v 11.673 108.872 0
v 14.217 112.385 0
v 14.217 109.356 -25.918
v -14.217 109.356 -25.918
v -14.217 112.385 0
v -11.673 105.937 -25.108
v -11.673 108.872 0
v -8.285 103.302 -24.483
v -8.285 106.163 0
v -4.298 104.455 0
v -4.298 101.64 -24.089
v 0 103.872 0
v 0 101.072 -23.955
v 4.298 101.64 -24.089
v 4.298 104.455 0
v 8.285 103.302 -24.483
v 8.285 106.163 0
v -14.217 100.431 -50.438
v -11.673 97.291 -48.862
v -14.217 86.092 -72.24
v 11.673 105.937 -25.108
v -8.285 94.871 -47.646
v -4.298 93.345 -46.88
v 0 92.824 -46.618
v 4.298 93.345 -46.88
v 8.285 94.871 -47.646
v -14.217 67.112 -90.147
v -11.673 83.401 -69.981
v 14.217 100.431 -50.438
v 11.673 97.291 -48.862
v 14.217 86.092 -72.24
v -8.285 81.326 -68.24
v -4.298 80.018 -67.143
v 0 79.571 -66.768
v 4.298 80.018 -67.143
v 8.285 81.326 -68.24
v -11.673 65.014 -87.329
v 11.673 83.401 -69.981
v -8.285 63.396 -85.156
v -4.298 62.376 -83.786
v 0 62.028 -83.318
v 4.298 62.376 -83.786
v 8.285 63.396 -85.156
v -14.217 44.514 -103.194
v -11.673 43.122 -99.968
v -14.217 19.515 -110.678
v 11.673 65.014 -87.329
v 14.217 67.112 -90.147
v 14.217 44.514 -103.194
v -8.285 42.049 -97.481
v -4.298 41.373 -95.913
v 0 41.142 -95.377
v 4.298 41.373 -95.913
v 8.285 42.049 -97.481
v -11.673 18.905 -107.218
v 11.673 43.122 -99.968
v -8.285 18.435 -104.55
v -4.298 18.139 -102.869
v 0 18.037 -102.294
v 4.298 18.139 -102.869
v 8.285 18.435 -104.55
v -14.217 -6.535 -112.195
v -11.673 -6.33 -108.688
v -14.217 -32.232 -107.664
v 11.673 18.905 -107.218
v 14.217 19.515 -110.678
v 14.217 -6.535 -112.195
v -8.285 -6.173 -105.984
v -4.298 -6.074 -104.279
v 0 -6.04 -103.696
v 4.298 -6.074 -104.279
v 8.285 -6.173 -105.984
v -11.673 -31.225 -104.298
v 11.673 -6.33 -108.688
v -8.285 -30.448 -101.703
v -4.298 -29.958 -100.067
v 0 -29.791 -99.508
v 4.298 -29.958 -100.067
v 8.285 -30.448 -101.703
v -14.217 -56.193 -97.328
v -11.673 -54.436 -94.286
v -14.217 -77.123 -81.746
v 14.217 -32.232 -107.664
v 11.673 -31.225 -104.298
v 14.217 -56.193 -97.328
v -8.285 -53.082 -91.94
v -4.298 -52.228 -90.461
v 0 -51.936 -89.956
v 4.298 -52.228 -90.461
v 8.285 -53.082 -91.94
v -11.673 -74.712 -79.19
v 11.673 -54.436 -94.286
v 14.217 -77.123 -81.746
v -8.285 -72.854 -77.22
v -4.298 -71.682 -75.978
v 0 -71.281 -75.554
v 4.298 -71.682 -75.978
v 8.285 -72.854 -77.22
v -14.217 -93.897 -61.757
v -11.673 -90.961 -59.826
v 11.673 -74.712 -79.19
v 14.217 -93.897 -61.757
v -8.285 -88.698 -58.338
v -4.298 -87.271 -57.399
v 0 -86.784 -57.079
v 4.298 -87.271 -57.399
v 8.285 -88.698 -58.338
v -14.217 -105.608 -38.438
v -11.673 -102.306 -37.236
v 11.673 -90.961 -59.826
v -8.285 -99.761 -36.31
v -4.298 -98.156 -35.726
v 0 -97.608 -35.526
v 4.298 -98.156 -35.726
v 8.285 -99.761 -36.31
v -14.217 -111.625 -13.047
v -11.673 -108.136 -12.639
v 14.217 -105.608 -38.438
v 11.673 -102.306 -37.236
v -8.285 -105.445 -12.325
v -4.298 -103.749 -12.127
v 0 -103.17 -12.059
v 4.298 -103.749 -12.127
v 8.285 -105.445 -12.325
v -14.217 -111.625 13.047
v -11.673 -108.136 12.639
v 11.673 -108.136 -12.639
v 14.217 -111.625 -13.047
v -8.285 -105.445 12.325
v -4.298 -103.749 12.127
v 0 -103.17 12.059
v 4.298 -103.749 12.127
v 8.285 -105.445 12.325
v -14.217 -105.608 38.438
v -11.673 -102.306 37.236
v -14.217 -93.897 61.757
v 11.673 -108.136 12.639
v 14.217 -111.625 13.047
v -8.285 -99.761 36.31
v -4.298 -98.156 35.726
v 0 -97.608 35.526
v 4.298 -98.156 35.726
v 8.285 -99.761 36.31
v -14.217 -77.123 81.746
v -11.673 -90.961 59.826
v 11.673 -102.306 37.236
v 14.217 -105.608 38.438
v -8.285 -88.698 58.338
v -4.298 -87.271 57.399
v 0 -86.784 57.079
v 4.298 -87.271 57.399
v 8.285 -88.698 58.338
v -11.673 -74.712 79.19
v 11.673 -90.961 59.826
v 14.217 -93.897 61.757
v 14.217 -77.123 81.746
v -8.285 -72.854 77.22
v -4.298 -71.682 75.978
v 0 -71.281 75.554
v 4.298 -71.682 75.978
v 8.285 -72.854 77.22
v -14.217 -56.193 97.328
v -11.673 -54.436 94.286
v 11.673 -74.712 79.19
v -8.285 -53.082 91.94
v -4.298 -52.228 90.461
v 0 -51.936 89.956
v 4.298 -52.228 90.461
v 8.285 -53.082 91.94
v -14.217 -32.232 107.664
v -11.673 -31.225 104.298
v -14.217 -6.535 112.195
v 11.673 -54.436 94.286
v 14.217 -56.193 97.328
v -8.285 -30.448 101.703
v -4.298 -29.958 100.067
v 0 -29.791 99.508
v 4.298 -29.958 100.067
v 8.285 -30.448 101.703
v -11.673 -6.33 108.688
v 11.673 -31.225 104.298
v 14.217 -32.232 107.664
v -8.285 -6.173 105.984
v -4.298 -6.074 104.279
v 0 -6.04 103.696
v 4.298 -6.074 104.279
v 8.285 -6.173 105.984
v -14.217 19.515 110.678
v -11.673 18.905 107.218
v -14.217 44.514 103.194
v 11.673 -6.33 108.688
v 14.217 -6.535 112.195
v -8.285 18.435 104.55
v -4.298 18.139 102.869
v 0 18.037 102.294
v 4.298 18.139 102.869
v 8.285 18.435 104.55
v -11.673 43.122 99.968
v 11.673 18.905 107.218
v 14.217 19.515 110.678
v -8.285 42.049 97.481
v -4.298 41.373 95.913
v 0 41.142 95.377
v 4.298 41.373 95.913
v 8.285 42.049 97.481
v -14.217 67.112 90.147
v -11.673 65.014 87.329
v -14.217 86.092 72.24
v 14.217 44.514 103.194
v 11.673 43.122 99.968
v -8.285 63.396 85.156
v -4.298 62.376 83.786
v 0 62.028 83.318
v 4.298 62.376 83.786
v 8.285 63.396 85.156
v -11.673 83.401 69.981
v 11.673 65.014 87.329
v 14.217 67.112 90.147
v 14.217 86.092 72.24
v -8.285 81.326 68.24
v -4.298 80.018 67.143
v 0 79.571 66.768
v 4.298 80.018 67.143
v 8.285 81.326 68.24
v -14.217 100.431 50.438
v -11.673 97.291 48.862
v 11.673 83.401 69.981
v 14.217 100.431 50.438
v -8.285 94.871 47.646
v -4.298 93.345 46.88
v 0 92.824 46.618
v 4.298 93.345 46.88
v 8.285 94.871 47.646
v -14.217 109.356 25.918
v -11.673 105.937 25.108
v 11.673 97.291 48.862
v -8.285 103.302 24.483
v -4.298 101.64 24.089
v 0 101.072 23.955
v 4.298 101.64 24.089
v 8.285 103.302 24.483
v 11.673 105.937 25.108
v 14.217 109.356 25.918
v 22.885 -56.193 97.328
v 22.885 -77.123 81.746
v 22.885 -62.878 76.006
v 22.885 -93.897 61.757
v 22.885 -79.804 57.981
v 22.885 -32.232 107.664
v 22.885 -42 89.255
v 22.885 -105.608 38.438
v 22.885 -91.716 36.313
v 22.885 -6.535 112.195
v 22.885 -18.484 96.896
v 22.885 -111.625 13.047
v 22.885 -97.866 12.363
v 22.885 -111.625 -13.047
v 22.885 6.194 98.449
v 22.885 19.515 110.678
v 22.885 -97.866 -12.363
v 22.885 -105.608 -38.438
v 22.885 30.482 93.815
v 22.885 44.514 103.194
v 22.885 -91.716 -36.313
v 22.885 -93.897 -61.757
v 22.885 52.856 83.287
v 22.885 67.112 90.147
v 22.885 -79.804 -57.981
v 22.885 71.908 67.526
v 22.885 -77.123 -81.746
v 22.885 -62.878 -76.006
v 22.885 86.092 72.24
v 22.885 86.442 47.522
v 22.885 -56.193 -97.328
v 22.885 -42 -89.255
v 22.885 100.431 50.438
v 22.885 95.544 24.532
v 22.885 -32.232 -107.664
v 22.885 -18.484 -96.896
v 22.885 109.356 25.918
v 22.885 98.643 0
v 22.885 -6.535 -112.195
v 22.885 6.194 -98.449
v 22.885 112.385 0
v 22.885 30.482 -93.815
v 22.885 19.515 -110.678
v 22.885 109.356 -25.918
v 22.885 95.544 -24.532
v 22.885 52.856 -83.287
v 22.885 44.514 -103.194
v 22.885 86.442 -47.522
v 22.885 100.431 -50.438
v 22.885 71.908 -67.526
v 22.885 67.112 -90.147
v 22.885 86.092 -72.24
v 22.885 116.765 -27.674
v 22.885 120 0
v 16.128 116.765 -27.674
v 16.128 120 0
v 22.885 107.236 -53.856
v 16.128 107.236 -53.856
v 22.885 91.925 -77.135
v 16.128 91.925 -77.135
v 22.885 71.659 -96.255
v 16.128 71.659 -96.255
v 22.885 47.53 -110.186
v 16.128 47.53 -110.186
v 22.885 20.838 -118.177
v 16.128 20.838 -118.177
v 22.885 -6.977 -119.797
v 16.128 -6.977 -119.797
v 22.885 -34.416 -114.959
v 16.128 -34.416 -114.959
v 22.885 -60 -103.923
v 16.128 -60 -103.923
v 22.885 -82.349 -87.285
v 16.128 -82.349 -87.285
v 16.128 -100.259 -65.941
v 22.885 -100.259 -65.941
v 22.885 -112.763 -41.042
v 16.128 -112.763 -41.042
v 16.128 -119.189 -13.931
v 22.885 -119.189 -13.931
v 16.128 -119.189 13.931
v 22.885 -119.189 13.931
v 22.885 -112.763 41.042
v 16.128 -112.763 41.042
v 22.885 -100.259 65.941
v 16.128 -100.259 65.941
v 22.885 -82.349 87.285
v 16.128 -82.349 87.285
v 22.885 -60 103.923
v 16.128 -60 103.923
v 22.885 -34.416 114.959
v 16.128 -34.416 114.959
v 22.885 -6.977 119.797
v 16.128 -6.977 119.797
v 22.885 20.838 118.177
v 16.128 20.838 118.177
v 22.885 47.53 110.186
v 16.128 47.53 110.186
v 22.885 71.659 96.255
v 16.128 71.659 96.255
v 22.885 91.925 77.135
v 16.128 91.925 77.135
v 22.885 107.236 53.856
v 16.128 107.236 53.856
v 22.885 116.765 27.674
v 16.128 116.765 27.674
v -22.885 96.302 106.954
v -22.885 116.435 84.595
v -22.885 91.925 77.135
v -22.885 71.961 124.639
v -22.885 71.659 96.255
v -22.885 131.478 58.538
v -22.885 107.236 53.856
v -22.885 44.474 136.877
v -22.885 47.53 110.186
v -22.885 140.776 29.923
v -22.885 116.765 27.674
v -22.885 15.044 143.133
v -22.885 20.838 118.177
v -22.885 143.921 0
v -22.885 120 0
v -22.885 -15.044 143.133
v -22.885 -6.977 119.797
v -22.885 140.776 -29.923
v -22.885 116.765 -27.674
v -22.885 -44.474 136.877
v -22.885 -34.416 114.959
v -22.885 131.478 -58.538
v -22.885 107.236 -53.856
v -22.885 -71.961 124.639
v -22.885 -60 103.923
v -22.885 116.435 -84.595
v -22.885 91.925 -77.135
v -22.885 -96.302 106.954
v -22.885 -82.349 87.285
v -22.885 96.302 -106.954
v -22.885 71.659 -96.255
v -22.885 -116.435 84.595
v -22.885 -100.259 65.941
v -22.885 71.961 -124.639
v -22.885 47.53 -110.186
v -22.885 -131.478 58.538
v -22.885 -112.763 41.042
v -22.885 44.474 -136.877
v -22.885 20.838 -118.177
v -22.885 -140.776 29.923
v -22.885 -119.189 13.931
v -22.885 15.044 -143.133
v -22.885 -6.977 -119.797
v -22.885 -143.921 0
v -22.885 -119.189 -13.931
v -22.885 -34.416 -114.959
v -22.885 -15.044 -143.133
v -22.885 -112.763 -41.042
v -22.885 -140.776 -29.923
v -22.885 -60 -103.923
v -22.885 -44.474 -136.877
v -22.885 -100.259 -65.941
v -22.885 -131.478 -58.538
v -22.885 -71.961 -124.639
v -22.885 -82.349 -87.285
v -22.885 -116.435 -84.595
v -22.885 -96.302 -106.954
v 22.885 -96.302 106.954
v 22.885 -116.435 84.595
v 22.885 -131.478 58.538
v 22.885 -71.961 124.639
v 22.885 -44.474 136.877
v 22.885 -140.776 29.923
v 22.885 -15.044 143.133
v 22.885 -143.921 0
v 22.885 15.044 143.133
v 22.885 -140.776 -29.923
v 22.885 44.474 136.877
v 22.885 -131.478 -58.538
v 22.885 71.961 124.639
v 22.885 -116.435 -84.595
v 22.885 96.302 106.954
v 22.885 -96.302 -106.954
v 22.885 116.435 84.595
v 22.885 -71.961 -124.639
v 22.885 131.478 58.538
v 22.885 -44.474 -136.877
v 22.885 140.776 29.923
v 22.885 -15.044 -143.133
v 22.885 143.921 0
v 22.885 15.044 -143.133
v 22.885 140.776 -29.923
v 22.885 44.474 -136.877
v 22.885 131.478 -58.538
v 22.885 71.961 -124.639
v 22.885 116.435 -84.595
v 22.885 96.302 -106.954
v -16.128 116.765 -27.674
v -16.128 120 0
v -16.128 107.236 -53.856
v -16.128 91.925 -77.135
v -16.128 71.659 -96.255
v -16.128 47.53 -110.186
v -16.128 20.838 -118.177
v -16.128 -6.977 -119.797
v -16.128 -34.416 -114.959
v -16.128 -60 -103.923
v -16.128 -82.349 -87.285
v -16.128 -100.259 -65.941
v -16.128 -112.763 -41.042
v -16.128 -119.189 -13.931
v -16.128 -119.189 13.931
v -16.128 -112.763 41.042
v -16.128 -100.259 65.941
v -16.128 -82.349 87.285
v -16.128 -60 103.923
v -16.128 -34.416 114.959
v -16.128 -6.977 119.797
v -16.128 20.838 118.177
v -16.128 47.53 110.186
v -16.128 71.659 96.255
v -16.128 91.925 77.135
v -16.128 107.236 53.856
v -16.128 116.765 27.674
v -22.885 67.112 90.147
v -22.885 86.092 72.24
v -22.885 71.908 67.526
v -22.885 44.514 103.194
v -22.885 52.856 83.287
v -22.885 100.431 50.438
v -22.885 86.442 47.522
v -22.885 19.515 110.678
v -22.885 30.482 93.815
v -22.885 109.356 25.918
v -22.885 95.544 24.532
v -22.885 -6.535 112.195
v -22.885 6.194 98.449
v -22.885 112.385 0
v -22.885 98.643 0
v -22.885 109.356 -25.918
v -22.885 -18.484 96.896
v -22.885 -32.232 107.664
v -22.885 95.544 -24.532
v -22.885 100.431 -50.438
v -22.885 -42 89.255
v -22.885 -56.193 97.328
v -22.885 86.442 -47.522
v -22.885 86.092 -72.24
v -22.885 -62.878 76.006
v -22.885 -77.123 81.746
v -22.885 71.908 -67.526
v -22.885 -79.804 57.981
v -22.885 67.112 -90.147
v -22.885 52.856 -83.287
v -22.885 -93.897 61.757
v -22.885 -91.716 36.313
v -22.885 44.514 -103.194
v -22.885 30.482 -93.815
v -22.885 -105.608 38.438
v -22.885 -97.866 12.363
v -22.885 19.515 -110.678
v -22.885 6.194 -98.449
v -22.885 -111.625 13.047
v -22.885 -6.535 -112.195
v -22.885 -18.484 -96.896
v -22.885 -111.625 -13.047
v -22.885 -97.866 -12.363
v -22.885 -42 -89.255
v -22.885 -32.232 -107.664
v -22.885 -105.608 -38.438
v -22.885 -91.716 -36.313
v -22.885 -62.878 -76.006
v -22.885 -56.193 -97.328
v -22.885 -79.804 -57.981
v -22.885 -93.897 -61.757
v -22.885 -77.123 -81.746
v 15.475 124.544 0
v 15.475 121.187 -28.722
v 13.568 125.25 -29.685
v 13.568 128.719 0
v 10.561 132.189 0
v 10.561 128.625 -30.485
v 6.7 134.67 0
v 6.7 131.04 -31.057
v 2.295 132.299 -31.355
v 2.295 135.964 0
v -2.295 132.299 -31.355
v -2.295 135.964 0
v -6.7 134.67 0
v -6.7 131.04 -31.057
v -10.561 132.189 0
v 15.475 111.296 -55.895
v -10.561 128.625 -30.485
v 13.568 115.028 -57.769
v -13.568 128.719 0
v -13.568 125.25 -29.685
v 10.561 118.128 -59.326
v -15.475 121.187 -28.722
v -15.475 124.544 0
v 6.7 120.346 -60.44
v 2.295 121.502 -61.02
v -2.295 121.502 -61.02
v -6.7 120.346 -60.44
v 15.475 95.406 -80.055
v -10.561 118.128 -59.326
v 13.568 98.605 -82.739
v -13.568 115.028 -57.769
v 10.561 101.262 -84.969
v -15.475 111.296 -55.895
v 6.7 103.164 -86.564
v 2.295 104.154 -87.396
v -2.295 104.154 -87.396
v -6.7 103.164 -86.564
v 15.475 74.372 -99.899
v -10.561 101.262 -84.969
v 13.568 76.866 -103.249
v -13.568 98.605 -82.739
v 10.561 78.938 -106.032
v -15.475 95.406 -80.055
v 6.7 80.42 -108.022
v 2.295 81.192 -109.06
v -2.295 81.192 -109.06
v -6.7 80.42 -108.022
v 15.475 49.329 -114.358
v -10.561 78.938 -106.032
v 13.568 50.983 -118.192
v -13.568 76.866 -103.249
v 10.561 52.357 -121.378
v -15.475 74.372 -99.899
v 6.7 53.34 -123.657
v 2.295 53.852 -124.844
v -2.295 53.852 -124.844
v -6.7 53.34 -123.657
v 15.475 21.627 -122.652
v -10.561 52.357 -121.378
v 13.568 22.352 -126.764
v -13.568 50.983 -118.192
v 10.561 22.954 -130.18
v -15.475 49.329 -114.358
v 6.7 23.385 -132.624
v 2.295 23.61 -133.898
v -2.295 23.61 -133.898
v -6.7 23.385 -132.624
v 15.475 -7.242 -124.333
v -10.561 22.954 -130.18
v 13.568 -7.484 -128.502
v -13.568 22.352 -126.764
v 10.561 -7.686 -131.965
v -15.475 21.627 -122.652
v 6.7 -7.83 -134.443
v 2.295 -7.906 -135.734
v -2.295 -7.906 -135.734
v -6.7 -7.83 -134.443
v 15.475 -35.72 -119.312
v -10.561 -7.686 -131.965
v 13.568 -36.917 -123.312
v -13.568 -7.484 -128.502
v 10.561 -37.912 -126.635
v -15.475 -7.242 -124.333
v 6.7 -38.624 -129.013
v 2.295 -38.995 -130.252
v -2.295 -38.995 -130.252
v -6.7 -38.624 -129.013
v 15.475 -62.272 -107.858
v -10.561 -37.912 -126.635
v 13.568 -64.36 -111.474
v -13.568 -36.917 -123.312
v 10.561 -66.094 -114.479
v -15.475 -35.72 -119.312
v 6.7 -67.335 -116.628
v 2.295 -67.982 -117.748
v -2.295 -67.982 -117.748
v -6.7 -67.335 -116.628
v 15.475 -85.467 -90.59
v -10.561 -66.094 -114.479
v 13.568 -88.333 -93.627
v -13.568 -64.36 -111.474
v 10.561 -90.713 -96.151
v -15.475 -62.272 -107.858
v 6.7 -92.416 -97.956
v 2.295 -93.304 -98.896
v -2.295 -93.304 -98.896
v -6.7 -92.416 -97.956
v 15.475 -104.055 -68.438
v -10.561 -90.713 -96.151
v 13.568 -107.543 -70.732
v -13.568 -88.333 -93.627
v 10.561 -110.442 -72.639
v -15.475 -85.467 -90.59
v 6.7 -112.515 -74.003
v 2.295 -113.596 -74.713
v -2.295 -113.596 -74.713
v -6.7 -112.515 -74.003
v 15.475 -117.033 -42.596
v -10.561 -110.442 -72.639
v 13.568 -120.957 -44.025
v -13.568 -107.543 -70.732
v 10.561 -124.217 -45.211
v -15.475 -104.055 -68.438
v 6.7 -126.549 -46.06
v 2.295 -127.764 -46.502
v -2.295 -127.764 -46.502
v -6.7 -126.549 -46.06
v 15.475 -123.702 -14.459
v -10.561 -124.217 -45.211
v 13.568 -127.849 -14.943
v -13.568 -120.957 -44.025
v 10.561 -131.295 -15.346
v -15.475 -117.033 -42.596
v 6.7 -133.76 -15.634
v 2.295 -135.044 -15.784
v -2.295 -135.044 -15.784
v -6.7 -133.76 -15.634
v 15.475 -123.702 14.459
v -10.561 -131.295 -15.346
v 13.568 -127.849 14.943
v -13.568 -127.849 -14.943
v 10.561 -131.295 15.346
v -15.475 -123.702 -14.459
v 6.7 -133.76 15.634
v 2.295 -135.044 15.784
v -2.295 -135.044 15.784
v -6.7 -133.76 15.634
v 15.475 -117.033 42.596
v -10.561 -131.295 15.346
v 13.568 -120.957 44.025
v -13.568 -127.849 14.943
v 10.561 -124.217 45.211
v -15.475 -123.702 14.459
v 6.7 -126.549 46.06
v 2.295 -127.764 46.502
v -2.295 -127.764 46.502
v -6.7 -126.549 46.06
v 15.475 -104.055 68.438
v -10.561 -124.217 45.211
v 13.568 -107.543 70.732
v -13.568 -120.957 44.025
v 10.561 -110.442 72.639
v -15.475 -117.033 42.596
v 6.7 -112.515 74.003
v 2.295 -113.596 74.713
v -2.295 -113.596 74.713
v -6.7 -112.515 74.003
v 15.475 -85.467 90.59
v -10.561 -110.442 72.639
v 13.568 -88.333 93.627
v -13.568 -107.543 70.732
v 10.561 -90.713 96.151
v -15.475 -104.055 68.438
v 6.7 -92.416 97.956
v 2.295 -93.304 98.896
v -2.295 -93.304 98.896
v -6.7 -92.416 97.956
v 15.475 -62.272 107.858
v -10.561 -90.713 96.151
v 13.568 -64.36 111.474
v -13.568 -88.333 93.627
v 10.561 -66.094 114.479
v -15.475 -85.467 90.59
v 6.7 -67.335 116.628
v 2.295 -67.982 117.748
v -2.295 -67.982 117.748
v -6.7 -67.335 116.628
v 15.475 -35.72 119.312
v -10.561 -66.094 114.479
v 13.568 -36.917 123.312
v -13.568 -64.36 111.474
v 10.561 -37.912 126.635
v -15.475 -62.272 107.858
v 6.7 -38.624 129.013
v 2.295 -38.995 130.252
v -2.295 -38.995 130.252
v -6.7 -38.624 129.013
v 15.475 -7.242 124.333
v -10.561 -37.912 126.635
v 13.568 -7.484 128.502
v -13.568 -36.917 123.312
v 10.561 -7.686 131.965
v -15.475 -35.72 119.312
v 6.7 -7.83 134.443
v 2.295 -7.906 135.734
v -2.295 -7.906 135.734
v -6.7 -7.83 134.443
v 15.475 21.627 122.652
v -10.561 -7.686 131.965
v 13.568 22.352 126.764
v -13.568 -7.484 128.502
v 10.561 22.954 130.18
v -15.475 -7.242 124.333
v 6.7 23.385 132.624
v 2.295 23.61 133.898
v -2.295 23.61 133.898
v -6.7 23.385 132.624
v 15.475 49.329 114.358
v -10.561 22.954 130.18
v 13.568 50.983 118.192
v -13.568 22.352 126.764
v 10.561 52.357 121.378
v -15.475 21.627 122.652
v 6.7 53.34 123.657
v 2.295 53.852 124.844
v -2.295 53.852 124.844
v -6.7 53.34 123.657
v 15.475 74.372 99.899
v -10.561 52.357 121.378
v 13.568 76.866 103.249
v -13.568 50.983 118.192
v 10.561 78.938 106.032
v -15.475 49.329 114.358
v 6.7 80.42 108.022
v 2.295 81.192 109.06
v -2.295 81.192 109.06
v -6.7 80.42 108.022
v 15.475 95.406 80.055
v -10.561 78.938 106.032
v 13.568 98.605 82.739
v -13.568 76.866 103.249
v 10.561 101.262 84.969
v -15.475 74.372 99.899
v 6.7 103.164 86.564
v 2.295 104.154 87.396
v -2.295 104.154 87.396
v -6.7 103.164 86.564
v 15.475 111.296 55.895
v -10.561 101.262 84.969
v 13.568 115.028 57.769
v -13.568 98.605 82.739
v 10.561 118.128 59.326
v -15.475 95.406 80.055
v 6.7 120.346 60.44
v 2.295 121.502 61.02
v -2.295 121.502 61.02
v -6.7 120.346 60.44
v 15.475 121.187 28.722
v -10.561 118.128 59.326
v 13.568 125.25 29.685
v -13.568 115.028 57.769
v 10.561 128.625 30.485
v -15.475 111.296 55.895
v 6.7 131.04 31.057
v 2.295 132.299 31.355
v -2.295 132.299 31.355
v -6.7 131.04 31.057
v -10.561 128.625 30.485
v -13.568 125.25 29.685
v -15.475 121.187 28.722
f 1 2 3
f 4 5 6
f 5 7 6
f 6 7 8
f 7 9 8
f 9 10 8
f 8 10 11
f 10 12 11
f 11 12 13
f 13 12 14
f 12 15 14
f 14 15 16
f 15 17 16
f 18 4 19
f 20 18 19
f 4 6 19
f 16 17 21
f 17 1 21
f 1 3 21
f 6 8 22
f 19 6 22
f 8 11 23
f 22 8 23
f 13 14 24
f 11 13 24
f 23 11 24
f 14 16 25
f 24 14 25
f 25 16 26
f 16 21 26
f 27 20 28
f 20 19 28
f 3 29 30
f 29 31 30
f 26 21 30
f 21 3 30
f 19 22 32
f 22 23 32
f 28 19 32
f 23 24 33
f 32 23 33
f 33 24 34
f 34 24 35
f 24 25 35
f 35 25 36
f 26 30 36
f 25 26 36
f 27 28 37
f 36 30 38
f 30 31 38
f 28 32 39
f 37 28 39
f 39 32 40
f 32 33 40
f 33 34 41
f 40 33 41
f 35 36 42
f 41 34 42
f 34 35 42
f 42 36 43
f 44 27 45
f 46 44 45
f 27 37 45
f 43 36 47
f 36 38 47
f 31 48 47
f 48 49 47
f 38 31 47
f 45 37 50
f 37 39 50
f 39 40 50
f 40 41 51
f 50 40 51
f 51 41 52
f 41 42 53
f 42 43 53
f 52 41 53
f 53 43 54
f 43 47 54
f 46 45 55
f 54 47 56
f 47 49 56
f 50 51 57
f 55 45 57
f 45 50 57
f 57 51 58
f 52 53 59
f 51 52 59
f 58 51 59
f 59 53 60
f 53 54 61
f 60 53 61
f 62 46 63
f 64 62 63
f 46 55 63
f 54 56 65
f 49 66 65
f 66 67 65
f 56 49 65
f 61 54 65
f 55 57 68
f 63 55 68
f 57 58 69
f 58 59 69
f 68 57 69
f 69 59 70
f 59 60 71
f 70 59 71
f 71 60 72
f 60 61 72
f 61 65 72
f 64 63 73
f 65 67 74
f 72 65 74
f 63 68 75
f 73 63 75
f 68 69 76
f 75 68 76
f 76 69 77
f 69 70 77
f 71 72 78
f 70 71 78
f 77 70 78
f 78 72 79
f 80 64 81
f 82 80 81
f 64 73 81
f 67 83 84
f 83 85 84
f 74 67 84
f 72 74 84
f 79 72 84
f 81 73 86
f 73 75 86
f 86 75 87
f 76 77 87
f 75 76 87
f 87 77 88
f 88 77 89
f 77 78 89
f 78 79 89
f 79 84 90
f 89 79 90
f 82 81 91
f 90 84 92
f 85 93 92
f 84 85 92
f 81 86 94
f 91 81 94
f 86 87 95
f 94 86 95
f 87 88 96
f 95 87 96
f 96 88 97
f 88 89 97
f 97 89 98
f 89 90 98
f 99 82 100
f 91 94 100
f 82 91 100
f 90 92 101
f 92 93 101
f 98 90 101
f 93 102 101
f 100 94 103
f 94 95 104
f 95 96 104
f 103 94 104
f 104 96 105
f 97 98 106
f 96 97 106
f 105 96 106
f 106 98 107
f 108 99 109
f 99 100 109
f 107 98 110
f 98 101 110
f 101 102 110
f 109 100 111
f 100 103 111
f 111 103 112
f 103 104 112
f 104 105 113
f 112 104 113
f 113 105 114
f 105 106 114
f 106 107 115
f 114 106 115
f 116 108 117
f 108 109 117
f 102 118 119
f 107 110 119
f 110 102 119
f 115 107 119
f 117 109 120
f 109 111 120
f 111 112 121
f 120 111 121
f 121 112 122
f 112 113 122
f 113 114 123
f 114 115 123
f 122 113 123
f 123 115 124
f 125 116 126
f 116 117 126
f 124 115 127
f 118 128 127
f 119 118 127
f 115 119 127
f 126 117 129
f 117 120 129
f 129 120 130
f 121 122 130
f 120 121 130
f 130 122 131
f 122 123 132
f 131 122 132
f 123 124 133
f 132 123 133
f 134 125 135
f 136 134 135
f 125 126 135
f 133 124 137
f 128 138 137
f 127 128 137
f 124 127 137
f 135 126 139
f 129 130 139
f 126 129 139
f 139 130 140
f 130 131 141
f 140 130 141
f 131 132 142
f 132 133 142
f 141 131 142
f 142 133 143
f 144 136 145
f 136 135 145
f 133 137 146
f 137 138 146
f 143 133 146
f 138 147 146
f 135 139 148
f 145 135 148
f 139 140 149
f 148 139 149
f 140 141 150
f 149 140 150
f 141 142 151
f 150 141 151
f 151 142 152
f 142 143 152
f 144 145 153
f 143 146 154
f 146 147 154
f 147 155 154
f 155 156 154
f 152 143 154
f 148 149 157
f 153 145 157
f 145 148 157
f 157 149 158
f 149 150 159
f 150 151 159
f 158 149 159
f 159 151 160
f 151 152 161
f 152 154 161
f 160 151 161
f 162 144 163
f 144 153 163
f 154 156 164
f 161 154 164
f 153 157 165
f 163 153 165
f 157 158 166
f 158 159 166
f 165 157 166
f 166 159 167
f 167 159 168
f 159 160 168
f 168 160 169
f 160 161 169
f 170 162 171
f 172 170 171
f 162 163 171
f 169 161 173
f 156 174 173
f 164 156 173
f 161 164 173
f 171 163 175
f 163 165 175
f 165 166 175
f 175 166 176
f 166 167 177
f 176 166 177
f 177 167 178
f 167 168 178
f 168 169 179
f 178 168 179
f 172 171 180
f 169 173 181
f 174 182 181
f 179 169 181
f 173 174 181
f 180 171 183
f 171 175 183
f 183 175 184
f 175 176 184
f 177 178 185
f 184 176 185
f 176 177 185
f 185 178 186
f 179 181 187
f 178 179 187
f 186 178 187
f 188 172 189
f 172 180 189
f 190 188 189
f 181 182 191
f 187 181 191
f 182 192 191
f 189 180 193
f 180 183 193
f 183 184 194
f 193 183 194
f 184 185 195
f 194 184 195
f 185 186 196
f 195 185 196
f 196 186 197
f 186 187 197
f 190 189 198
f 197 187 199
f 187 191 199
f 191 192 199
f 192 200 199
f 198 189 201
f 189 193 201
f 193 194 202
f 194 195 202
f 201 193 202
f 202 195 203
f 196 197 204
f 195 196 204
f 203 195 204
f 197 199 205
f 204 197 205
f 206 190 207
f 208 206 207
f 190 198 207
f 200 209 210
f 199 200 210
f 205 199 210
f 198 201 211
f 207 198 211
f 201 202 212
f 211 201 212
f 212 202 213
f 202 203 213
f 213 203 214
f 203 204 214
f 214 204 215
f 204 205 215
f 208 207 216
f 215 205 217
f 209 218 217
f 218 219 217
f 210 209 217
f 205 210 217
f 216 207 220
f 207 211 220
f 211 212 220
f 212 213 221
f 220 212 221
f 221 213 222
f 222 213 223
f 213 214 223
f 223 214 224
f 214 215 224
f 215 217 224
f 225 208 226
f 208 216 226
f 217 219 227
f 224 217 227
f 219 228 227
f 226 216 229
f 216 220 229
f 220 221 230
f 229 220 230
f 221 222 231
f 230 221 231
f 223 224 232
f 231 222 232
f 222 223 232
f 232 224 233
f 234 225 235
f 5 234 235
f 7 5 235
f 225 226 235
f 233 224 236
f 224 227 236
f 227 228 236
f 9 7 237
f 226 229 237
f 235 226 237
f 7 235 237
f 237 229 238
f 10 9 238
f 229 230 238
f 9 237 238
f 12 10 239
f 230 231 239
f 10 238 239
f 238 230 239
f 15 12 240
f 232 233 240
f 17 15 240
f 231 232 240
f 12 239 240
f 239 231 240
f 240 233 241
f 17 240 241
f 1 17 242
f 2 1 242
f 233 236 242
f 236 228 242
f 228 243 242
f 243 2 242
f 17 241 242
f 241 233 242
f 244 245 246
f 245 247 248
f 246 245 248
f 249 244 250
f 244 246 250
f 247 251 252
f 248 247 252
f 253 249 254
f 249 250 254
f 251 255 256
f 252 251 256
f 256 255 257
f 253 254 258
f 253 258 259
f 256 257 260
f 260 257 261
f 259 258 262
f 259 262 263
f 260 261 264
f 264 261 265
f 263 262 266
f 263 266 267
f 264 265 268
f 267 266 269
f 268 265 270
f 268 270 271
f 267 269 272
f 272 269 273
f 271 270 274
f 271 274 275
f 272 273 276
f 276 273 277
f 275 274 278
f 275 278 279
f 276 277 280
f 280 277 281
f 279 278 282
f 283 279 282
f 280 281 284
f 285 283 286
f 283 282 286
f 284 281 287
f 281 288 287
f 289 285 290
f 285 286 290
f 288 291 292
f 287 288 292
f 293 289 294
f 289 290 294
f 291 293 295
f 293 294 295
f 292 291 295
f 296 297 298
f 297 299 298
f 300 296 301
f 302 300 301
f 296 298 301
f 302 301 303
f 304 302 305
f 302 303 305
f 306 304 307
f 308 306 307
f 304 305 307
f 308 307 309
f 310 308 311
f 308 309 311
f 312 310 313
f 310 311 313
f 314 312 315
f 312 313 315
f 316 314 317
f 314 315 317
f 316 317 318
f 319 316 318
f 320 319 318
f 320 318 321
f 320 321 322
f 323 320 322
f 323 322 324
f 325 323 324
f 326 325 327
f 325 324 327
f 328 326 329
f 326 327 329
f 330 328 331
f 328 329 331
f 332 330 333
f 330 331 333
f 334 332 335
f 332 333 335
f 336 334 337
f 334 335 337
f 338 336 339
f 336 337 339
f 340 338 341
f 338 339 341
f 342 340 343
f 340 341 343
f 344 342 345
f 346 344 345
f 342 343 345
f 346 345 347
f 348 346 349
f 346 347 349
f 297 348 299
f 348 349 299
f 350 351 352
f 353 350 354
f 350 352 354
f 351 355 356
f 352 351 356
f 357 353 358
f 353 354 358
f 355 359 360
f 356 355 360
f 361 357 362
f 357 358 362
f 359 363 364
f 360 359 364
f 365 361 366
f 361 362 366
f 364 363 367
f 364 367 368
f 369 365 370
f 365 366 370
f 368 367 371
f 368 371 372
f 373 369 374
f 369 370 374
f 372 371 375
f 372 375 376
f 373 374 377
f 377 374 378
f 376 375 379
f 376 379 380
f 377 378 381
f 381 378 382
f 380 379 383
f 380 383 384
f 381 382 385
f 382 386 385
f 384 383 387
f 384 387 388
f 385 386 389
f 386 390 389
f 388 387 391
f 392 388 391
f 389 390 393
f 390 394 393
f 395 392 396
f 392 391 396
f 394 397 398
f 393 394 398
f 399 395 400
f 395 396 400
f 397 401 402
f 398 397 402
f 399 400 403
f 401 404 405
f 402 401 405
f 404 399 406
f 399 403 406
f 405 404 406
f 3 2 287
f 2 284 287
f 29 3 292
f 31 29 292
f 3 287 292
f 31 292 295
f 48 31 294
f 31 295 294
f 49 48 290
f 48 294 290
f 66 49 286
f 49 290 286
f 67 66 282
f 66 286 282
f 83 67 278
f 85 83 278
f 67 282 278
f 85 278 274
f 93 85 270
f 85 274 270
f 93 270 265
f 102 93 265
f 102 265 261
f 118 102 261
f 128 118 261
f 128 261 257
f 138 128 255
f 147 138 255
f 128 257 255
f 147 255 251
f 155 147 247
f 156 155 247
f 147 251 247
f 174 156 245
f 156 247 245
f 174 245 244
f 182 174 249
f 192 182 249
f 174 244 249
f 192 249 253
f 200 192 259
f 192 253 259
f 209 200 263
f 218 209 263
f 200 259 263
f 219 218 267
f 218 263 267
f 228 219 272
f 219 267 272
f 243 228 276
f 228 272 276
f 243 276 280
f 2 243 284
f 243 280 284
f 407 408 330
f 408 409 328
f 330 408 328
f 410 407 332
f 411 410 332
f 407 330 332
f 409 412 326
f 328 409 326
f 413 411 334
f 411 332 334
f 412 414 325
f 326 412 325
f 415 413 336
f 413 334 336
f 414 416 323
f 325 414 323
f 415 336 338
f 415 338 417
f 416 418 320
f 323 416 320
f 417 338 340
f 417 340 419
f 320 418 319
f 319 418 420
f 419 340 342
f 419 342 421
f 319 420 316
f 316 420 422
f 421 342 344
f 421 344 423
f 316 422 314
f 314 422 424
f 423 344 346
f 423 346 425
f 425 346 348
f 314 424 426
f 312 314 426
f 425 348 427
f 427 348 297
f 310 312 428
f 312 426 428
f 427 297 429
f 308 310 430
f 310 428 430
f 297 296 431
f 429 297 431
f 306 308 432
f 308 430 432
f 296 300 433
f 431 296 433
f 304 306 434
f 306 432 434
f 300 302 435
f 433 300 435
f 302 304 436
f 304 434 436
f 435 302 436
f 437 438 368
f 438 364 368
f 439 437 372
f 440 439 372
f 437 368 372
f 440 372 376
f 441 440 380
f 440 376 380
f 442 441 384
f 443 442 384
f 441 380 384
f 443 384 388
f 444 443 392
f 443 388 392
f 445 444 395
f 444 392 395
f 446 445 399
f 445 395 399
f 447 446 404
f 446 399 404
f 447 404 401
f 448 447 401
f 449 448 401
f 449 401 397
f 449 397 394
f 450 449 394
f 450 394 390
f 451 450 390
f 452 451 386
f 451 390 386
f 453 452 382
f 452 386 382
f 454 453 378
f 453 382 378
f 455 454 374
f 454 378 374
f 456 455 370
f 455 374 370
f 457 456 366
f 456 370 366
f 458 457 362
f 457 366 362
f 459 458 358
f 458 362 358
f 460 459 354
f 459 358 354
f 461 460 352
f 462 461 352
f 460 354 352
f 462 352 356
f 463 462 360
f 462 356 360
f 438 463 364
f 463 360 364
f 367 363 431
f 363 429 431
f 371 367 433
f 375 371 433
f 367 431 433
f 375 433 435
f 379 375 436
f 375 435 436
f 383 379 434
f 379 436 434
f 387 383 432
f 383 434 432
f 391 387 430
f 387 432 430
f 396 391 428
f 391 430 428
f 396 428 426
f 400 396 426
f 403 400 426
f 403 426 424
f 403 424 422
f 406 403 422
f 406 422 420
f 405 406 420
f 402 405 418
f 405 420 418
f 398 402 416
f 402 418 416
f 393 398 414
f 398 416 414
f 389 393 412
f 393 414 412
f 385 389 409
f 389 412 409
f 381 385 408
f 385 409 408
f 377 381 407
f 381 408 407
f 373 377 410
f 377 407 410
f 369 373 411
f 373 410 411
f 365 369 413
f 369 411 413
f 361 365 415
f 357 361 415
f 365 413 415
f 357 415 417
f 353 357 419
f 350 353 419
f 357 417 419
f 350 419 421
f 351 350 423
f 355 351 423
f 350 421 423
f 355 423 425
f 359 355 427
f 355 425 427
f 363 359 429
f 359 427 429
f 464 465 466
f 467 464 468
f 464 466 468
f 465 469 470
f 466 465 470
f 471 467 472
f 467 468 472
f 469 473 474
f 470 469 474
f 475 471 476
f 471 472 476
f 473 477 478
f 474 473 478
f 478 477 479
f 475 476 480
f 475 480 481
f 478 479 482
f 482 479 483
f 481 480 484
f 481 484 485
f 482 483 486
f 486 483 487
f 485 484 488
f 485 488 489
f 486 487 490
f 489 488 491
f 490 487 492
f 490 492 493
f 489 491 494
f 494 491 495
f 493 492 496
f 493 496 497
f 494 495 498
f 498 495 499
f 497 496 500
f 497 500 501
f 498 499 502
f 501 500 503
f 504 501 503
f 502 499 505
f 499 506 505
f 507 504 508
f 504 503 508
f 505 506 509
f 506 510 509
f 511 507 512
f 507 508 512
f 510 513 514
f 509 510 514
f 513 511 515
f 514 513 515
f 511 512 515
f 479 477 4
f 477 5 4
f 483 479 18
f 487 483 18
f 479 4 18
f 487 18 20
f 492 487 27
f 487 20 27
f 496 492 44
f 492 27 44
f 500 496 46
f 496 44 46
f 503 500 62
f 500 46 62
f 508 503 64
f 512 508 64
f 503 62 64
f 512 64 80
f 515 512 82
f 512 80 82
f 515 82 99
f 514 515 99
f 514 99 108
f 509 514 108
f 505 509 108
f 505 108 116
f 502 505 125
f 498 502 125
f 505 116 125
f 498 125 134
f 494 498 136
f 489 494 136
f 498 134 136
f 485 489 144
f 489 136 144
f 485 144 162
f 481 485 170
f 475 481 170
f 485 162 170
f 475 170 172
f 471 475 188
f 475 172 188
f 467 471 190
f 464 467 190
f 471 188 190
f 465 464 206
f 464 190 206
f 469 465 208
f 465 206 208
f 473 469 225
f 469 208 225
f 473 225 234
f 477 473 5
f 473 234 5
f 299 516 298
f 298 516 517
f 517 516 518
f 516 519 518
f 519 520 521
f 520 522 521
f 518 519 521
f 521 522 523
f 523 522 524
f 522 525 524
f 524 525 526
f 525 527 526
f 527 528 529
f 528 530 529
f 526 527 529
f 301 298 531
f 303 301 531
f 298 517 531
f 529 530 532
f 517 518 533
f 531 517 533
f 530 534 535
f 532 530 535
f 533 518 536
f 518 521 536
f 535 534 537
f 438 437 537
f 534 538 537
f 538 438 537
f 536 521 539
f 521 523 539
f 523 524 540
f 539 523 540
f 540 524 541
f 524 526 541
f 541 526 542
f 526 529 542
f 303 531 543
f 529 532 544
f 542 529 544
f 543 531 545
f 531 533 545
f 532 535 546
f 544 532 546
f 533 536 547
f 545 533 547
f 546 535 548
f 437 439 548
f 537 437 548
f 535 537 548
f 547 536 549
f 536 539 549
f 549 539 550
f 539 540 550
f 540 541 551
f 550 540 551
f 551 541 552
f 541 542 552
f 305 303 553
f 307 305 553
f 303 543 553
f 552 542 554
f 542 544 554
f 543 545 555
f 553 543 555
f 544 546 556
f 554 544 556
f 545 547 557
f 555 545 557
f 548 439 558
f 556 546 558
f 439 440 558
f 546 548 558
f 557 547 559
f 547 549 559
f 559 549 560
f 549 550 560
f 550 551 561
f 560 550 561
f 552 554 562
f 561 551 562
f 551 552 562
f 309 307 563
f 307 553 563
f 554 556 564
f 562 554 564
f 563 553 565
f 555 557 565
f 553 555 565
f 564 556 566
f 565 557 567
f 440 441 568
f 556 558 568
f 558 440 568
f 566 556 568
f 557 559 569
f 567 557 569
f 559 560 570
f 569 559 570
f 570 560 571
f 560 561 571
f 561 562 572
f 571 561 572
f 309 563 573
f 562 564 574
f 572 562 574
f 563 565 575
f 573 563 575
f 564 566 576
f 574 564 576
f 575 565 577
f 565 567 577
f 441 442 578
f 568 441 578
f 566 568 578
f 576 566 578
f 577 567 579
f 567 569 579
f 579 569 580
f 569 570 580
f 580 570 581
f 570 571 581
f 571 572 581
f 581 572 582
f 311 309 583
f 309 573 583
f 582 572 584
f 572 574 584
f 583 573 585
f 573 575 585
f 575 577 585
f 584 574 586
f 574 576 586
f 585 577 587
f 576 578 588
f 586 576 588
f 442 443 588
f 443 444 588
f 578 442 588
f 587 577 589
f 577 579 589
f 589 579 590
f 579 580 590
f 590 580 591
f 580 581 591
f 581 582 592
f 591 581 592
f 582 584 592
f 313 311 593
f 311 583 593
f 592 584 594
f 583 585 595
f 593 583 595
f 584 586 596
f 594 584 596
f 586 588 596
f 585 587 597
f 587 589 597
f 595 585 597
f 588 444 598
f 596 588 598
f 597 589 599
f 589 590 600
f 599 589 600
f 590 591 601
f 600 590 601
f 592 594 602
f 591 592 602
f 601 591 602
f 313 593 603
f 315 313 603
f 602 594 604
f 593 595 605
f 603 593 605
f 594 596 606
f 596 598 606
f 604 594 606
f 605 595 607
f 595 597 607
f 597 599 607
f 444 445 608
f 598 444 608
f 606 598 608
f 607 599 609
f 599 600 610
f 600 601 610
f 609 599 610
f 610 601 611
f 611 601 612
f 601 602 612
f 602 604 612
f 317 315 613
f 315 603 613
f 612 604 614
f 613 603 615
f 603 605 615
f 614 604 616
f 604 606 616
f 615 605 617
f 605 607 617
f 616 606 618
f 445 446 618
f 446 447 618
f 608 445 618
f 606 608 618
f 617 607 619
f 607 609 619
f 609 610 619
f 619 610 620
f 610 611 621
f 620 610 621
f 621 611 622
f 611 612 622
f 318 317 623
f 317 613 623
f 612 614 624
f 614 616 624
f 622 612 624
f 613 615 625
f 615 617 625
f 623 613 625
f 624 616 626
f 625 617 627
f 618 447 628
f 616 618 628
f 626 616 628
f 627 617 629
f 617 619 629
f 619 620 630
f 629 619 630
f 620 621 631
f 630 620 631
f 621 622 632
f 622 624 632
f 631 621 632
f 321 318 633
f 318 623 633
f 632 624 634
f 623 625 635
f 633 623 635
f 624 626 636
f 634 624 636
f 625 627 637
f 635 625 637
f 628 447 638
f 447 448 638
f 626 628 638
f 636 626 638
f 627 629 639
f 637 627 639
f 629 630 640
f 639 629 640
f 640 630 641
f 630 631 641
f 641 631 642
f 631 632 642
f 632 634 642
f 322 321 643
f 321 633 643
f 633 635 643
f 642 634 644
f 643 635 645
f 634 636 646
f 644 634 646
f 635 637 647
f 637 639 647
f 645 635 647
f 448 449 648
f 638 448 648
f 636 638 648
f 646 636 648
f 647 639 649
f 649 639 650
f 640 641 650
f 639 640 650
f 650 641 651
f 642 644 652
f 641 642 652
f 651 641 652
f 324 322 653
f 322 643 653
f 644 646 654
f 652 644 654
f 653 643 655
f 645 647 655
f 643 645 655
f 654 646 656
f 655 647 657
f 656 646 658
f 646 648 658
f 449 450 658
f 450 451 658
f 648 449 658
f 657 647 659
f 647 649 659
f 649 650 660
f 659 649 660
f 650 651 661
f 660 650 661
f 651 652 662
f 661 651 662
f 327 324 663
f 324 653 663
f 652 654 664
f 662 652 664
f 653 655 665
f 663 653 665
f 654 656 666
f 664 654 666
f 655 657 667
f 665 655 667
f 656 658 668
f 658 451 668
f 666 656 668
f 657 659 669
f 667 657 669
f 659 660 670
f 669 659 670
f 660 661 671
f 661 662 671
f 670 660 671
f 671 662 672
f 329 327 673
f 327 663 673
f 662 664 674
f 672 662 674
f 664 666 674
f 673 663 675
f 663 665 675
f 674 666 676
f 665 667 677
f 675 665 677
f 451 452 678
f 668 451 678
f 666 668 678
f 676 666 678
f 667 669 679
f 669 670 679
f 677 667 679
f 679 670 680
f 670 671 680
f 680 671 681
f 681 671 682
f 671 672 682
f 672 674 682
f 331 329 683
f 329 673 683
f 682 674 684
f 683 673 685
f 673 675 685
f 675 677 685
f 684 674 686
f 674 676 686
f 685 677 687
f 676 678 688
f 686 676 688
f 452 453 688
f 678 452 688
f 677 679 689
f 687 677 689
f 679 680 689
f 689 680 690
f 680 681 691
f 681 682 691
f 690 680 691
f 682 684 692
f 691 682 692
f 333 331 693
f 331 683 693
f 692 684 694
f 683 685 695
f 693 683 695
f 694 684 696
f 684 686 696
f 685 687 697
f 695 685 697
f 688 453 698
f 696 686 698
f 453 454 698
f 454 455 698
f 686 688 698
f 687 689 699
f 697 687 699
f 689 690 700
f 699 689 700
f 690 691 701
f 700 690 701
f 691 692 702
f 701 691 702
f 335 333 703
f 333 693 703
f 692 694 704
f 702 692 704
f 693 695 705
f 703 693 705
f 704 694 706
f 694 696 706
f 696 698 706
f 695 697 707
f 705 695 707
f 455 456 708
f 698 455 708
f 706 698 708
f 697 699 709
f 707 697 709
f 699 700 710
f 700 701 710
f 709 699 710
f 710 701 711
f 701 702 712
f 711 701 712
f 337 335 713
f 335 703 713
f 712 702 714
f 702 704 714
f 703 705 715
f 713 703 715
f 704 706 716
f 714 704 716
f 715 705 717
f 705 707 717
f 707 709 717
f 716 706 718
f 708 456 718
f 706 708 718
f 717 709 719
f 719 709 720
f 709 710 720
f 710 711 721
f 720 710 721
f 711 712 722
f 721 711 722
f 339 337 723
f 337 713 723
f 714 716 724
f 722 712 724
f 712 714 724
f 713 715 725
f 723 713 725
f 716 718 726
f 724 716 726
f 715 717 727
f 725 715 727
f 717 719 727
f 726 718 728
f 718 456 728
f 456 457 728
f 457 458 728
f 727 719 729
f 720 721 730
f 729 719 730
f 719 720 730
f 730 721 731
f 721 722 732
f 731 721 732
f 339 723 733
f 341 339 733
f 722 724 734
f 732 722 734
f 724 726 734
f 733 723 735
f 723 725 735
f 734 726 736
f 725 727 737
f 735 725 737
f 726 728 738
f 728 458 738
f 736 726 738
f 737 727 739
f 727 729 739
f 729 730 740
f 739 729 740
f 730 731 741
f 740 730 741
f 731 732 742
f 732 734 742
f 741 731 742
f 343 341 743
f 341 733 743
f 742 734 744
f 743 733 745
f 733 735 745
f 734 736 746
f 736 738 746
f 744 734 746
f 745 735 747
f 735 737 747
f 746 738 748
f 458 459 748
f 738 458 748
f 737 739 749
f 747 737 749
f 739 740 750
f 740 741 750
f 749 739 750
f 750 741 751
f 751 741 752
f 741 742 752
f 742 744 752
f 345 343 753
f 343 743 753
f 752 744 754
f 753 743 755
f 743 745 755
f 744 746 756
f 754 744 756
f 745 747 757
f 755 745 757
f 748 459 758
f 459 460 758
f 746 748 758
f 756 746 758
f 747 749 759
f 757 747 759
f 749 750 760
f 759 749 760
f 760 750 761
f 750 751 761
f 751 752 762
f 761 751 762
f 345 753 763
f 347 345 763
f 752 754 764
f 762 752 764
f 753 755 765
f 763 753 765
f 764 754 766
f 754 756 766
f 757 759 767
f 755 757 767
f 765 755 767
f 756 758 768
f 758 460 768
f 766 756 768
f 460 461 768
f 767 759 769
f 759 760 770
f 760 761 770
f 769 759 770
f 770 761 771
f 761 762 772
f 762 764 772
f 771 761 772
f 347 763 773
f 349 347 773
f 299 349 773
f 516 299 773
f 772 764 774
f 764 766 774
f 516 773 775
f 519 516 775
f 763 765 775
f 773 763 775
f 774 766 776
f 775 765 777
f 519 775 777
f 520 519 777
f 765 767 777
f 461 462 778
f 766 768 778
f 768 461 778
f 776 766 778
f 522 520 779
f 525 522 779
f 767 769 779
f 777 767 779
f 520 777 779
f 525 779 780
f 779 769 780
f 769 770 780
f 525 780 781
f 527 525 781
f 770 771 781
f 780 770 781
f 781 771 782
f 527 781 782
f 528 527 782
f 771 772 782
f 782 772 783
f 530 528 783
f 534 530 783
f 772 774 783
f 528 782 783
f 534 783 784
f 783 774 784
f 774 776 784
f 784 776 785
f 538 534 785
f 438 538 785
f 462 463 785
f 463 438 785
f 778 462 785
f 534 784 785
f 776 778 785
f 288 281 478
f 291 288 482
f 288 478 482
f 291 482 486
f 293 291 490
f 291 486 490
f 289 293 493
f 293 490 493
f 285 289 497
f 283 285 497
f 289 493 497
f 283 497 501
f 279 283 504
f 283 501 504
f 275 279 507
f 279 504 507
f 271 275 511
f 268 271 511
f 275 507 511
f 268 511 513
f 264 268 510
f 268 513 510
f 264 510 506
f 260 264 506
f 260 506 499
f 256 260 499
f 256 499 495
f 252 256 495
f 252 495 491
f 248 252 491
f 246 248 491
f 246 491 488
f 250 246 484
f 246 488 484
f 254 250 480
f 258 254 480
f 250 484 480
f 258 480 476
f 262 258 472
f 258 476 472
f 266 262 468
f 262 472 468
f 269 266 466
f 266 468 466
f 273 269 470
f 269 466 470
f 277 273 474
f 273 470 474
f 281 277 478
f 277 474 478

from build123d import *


with BuildPart() as part:
    # Sketch1 → Revolve5 (revolve)
    with BuildSketch(Plane.XY):
        with BuildLine():
            Line((-16.127831396, 120), (-22.884866264, 120))
            Line((-22.884866264, 120), (-22.884866264, 143.921086162))
            Line((-22.884866264, 143.921086162), (22.884866264, 143.921086162))
            Line((22.884866264, 143.921086162), (22.884866264, 120))
            Line((22.884866264, 120), (16.127831396, 120))
            ThreePointArc((16.127831396, 120), (0, 136.127831396), (-16.127831396, 120))
        make_face()
        with BuildLine():
            Line((22.884866264, 98.643368221), (-22.884866264, 98.643368221))
            Line((-22.884866264, 98.643368221), (-22.884866264, 112.385243705))
            Line((-22.884866264, 112.385243705), (-14.216976898, 112.385243705))
            ThreePointArc((-14.216976898, 112.385243705), (0, 103.872168604), (14.216976898, 112.385243705))
            Line((14.216976898, 112.385243705), (22.884866264, 112.385243705))
            Line((22.884866264, 112.385243705), (22.884866264, 98.643368221))
        make_face()
    revolve(axis=Axis((89.103484186, 0, 0), (-1, 0, 0)))


solid = part.part
